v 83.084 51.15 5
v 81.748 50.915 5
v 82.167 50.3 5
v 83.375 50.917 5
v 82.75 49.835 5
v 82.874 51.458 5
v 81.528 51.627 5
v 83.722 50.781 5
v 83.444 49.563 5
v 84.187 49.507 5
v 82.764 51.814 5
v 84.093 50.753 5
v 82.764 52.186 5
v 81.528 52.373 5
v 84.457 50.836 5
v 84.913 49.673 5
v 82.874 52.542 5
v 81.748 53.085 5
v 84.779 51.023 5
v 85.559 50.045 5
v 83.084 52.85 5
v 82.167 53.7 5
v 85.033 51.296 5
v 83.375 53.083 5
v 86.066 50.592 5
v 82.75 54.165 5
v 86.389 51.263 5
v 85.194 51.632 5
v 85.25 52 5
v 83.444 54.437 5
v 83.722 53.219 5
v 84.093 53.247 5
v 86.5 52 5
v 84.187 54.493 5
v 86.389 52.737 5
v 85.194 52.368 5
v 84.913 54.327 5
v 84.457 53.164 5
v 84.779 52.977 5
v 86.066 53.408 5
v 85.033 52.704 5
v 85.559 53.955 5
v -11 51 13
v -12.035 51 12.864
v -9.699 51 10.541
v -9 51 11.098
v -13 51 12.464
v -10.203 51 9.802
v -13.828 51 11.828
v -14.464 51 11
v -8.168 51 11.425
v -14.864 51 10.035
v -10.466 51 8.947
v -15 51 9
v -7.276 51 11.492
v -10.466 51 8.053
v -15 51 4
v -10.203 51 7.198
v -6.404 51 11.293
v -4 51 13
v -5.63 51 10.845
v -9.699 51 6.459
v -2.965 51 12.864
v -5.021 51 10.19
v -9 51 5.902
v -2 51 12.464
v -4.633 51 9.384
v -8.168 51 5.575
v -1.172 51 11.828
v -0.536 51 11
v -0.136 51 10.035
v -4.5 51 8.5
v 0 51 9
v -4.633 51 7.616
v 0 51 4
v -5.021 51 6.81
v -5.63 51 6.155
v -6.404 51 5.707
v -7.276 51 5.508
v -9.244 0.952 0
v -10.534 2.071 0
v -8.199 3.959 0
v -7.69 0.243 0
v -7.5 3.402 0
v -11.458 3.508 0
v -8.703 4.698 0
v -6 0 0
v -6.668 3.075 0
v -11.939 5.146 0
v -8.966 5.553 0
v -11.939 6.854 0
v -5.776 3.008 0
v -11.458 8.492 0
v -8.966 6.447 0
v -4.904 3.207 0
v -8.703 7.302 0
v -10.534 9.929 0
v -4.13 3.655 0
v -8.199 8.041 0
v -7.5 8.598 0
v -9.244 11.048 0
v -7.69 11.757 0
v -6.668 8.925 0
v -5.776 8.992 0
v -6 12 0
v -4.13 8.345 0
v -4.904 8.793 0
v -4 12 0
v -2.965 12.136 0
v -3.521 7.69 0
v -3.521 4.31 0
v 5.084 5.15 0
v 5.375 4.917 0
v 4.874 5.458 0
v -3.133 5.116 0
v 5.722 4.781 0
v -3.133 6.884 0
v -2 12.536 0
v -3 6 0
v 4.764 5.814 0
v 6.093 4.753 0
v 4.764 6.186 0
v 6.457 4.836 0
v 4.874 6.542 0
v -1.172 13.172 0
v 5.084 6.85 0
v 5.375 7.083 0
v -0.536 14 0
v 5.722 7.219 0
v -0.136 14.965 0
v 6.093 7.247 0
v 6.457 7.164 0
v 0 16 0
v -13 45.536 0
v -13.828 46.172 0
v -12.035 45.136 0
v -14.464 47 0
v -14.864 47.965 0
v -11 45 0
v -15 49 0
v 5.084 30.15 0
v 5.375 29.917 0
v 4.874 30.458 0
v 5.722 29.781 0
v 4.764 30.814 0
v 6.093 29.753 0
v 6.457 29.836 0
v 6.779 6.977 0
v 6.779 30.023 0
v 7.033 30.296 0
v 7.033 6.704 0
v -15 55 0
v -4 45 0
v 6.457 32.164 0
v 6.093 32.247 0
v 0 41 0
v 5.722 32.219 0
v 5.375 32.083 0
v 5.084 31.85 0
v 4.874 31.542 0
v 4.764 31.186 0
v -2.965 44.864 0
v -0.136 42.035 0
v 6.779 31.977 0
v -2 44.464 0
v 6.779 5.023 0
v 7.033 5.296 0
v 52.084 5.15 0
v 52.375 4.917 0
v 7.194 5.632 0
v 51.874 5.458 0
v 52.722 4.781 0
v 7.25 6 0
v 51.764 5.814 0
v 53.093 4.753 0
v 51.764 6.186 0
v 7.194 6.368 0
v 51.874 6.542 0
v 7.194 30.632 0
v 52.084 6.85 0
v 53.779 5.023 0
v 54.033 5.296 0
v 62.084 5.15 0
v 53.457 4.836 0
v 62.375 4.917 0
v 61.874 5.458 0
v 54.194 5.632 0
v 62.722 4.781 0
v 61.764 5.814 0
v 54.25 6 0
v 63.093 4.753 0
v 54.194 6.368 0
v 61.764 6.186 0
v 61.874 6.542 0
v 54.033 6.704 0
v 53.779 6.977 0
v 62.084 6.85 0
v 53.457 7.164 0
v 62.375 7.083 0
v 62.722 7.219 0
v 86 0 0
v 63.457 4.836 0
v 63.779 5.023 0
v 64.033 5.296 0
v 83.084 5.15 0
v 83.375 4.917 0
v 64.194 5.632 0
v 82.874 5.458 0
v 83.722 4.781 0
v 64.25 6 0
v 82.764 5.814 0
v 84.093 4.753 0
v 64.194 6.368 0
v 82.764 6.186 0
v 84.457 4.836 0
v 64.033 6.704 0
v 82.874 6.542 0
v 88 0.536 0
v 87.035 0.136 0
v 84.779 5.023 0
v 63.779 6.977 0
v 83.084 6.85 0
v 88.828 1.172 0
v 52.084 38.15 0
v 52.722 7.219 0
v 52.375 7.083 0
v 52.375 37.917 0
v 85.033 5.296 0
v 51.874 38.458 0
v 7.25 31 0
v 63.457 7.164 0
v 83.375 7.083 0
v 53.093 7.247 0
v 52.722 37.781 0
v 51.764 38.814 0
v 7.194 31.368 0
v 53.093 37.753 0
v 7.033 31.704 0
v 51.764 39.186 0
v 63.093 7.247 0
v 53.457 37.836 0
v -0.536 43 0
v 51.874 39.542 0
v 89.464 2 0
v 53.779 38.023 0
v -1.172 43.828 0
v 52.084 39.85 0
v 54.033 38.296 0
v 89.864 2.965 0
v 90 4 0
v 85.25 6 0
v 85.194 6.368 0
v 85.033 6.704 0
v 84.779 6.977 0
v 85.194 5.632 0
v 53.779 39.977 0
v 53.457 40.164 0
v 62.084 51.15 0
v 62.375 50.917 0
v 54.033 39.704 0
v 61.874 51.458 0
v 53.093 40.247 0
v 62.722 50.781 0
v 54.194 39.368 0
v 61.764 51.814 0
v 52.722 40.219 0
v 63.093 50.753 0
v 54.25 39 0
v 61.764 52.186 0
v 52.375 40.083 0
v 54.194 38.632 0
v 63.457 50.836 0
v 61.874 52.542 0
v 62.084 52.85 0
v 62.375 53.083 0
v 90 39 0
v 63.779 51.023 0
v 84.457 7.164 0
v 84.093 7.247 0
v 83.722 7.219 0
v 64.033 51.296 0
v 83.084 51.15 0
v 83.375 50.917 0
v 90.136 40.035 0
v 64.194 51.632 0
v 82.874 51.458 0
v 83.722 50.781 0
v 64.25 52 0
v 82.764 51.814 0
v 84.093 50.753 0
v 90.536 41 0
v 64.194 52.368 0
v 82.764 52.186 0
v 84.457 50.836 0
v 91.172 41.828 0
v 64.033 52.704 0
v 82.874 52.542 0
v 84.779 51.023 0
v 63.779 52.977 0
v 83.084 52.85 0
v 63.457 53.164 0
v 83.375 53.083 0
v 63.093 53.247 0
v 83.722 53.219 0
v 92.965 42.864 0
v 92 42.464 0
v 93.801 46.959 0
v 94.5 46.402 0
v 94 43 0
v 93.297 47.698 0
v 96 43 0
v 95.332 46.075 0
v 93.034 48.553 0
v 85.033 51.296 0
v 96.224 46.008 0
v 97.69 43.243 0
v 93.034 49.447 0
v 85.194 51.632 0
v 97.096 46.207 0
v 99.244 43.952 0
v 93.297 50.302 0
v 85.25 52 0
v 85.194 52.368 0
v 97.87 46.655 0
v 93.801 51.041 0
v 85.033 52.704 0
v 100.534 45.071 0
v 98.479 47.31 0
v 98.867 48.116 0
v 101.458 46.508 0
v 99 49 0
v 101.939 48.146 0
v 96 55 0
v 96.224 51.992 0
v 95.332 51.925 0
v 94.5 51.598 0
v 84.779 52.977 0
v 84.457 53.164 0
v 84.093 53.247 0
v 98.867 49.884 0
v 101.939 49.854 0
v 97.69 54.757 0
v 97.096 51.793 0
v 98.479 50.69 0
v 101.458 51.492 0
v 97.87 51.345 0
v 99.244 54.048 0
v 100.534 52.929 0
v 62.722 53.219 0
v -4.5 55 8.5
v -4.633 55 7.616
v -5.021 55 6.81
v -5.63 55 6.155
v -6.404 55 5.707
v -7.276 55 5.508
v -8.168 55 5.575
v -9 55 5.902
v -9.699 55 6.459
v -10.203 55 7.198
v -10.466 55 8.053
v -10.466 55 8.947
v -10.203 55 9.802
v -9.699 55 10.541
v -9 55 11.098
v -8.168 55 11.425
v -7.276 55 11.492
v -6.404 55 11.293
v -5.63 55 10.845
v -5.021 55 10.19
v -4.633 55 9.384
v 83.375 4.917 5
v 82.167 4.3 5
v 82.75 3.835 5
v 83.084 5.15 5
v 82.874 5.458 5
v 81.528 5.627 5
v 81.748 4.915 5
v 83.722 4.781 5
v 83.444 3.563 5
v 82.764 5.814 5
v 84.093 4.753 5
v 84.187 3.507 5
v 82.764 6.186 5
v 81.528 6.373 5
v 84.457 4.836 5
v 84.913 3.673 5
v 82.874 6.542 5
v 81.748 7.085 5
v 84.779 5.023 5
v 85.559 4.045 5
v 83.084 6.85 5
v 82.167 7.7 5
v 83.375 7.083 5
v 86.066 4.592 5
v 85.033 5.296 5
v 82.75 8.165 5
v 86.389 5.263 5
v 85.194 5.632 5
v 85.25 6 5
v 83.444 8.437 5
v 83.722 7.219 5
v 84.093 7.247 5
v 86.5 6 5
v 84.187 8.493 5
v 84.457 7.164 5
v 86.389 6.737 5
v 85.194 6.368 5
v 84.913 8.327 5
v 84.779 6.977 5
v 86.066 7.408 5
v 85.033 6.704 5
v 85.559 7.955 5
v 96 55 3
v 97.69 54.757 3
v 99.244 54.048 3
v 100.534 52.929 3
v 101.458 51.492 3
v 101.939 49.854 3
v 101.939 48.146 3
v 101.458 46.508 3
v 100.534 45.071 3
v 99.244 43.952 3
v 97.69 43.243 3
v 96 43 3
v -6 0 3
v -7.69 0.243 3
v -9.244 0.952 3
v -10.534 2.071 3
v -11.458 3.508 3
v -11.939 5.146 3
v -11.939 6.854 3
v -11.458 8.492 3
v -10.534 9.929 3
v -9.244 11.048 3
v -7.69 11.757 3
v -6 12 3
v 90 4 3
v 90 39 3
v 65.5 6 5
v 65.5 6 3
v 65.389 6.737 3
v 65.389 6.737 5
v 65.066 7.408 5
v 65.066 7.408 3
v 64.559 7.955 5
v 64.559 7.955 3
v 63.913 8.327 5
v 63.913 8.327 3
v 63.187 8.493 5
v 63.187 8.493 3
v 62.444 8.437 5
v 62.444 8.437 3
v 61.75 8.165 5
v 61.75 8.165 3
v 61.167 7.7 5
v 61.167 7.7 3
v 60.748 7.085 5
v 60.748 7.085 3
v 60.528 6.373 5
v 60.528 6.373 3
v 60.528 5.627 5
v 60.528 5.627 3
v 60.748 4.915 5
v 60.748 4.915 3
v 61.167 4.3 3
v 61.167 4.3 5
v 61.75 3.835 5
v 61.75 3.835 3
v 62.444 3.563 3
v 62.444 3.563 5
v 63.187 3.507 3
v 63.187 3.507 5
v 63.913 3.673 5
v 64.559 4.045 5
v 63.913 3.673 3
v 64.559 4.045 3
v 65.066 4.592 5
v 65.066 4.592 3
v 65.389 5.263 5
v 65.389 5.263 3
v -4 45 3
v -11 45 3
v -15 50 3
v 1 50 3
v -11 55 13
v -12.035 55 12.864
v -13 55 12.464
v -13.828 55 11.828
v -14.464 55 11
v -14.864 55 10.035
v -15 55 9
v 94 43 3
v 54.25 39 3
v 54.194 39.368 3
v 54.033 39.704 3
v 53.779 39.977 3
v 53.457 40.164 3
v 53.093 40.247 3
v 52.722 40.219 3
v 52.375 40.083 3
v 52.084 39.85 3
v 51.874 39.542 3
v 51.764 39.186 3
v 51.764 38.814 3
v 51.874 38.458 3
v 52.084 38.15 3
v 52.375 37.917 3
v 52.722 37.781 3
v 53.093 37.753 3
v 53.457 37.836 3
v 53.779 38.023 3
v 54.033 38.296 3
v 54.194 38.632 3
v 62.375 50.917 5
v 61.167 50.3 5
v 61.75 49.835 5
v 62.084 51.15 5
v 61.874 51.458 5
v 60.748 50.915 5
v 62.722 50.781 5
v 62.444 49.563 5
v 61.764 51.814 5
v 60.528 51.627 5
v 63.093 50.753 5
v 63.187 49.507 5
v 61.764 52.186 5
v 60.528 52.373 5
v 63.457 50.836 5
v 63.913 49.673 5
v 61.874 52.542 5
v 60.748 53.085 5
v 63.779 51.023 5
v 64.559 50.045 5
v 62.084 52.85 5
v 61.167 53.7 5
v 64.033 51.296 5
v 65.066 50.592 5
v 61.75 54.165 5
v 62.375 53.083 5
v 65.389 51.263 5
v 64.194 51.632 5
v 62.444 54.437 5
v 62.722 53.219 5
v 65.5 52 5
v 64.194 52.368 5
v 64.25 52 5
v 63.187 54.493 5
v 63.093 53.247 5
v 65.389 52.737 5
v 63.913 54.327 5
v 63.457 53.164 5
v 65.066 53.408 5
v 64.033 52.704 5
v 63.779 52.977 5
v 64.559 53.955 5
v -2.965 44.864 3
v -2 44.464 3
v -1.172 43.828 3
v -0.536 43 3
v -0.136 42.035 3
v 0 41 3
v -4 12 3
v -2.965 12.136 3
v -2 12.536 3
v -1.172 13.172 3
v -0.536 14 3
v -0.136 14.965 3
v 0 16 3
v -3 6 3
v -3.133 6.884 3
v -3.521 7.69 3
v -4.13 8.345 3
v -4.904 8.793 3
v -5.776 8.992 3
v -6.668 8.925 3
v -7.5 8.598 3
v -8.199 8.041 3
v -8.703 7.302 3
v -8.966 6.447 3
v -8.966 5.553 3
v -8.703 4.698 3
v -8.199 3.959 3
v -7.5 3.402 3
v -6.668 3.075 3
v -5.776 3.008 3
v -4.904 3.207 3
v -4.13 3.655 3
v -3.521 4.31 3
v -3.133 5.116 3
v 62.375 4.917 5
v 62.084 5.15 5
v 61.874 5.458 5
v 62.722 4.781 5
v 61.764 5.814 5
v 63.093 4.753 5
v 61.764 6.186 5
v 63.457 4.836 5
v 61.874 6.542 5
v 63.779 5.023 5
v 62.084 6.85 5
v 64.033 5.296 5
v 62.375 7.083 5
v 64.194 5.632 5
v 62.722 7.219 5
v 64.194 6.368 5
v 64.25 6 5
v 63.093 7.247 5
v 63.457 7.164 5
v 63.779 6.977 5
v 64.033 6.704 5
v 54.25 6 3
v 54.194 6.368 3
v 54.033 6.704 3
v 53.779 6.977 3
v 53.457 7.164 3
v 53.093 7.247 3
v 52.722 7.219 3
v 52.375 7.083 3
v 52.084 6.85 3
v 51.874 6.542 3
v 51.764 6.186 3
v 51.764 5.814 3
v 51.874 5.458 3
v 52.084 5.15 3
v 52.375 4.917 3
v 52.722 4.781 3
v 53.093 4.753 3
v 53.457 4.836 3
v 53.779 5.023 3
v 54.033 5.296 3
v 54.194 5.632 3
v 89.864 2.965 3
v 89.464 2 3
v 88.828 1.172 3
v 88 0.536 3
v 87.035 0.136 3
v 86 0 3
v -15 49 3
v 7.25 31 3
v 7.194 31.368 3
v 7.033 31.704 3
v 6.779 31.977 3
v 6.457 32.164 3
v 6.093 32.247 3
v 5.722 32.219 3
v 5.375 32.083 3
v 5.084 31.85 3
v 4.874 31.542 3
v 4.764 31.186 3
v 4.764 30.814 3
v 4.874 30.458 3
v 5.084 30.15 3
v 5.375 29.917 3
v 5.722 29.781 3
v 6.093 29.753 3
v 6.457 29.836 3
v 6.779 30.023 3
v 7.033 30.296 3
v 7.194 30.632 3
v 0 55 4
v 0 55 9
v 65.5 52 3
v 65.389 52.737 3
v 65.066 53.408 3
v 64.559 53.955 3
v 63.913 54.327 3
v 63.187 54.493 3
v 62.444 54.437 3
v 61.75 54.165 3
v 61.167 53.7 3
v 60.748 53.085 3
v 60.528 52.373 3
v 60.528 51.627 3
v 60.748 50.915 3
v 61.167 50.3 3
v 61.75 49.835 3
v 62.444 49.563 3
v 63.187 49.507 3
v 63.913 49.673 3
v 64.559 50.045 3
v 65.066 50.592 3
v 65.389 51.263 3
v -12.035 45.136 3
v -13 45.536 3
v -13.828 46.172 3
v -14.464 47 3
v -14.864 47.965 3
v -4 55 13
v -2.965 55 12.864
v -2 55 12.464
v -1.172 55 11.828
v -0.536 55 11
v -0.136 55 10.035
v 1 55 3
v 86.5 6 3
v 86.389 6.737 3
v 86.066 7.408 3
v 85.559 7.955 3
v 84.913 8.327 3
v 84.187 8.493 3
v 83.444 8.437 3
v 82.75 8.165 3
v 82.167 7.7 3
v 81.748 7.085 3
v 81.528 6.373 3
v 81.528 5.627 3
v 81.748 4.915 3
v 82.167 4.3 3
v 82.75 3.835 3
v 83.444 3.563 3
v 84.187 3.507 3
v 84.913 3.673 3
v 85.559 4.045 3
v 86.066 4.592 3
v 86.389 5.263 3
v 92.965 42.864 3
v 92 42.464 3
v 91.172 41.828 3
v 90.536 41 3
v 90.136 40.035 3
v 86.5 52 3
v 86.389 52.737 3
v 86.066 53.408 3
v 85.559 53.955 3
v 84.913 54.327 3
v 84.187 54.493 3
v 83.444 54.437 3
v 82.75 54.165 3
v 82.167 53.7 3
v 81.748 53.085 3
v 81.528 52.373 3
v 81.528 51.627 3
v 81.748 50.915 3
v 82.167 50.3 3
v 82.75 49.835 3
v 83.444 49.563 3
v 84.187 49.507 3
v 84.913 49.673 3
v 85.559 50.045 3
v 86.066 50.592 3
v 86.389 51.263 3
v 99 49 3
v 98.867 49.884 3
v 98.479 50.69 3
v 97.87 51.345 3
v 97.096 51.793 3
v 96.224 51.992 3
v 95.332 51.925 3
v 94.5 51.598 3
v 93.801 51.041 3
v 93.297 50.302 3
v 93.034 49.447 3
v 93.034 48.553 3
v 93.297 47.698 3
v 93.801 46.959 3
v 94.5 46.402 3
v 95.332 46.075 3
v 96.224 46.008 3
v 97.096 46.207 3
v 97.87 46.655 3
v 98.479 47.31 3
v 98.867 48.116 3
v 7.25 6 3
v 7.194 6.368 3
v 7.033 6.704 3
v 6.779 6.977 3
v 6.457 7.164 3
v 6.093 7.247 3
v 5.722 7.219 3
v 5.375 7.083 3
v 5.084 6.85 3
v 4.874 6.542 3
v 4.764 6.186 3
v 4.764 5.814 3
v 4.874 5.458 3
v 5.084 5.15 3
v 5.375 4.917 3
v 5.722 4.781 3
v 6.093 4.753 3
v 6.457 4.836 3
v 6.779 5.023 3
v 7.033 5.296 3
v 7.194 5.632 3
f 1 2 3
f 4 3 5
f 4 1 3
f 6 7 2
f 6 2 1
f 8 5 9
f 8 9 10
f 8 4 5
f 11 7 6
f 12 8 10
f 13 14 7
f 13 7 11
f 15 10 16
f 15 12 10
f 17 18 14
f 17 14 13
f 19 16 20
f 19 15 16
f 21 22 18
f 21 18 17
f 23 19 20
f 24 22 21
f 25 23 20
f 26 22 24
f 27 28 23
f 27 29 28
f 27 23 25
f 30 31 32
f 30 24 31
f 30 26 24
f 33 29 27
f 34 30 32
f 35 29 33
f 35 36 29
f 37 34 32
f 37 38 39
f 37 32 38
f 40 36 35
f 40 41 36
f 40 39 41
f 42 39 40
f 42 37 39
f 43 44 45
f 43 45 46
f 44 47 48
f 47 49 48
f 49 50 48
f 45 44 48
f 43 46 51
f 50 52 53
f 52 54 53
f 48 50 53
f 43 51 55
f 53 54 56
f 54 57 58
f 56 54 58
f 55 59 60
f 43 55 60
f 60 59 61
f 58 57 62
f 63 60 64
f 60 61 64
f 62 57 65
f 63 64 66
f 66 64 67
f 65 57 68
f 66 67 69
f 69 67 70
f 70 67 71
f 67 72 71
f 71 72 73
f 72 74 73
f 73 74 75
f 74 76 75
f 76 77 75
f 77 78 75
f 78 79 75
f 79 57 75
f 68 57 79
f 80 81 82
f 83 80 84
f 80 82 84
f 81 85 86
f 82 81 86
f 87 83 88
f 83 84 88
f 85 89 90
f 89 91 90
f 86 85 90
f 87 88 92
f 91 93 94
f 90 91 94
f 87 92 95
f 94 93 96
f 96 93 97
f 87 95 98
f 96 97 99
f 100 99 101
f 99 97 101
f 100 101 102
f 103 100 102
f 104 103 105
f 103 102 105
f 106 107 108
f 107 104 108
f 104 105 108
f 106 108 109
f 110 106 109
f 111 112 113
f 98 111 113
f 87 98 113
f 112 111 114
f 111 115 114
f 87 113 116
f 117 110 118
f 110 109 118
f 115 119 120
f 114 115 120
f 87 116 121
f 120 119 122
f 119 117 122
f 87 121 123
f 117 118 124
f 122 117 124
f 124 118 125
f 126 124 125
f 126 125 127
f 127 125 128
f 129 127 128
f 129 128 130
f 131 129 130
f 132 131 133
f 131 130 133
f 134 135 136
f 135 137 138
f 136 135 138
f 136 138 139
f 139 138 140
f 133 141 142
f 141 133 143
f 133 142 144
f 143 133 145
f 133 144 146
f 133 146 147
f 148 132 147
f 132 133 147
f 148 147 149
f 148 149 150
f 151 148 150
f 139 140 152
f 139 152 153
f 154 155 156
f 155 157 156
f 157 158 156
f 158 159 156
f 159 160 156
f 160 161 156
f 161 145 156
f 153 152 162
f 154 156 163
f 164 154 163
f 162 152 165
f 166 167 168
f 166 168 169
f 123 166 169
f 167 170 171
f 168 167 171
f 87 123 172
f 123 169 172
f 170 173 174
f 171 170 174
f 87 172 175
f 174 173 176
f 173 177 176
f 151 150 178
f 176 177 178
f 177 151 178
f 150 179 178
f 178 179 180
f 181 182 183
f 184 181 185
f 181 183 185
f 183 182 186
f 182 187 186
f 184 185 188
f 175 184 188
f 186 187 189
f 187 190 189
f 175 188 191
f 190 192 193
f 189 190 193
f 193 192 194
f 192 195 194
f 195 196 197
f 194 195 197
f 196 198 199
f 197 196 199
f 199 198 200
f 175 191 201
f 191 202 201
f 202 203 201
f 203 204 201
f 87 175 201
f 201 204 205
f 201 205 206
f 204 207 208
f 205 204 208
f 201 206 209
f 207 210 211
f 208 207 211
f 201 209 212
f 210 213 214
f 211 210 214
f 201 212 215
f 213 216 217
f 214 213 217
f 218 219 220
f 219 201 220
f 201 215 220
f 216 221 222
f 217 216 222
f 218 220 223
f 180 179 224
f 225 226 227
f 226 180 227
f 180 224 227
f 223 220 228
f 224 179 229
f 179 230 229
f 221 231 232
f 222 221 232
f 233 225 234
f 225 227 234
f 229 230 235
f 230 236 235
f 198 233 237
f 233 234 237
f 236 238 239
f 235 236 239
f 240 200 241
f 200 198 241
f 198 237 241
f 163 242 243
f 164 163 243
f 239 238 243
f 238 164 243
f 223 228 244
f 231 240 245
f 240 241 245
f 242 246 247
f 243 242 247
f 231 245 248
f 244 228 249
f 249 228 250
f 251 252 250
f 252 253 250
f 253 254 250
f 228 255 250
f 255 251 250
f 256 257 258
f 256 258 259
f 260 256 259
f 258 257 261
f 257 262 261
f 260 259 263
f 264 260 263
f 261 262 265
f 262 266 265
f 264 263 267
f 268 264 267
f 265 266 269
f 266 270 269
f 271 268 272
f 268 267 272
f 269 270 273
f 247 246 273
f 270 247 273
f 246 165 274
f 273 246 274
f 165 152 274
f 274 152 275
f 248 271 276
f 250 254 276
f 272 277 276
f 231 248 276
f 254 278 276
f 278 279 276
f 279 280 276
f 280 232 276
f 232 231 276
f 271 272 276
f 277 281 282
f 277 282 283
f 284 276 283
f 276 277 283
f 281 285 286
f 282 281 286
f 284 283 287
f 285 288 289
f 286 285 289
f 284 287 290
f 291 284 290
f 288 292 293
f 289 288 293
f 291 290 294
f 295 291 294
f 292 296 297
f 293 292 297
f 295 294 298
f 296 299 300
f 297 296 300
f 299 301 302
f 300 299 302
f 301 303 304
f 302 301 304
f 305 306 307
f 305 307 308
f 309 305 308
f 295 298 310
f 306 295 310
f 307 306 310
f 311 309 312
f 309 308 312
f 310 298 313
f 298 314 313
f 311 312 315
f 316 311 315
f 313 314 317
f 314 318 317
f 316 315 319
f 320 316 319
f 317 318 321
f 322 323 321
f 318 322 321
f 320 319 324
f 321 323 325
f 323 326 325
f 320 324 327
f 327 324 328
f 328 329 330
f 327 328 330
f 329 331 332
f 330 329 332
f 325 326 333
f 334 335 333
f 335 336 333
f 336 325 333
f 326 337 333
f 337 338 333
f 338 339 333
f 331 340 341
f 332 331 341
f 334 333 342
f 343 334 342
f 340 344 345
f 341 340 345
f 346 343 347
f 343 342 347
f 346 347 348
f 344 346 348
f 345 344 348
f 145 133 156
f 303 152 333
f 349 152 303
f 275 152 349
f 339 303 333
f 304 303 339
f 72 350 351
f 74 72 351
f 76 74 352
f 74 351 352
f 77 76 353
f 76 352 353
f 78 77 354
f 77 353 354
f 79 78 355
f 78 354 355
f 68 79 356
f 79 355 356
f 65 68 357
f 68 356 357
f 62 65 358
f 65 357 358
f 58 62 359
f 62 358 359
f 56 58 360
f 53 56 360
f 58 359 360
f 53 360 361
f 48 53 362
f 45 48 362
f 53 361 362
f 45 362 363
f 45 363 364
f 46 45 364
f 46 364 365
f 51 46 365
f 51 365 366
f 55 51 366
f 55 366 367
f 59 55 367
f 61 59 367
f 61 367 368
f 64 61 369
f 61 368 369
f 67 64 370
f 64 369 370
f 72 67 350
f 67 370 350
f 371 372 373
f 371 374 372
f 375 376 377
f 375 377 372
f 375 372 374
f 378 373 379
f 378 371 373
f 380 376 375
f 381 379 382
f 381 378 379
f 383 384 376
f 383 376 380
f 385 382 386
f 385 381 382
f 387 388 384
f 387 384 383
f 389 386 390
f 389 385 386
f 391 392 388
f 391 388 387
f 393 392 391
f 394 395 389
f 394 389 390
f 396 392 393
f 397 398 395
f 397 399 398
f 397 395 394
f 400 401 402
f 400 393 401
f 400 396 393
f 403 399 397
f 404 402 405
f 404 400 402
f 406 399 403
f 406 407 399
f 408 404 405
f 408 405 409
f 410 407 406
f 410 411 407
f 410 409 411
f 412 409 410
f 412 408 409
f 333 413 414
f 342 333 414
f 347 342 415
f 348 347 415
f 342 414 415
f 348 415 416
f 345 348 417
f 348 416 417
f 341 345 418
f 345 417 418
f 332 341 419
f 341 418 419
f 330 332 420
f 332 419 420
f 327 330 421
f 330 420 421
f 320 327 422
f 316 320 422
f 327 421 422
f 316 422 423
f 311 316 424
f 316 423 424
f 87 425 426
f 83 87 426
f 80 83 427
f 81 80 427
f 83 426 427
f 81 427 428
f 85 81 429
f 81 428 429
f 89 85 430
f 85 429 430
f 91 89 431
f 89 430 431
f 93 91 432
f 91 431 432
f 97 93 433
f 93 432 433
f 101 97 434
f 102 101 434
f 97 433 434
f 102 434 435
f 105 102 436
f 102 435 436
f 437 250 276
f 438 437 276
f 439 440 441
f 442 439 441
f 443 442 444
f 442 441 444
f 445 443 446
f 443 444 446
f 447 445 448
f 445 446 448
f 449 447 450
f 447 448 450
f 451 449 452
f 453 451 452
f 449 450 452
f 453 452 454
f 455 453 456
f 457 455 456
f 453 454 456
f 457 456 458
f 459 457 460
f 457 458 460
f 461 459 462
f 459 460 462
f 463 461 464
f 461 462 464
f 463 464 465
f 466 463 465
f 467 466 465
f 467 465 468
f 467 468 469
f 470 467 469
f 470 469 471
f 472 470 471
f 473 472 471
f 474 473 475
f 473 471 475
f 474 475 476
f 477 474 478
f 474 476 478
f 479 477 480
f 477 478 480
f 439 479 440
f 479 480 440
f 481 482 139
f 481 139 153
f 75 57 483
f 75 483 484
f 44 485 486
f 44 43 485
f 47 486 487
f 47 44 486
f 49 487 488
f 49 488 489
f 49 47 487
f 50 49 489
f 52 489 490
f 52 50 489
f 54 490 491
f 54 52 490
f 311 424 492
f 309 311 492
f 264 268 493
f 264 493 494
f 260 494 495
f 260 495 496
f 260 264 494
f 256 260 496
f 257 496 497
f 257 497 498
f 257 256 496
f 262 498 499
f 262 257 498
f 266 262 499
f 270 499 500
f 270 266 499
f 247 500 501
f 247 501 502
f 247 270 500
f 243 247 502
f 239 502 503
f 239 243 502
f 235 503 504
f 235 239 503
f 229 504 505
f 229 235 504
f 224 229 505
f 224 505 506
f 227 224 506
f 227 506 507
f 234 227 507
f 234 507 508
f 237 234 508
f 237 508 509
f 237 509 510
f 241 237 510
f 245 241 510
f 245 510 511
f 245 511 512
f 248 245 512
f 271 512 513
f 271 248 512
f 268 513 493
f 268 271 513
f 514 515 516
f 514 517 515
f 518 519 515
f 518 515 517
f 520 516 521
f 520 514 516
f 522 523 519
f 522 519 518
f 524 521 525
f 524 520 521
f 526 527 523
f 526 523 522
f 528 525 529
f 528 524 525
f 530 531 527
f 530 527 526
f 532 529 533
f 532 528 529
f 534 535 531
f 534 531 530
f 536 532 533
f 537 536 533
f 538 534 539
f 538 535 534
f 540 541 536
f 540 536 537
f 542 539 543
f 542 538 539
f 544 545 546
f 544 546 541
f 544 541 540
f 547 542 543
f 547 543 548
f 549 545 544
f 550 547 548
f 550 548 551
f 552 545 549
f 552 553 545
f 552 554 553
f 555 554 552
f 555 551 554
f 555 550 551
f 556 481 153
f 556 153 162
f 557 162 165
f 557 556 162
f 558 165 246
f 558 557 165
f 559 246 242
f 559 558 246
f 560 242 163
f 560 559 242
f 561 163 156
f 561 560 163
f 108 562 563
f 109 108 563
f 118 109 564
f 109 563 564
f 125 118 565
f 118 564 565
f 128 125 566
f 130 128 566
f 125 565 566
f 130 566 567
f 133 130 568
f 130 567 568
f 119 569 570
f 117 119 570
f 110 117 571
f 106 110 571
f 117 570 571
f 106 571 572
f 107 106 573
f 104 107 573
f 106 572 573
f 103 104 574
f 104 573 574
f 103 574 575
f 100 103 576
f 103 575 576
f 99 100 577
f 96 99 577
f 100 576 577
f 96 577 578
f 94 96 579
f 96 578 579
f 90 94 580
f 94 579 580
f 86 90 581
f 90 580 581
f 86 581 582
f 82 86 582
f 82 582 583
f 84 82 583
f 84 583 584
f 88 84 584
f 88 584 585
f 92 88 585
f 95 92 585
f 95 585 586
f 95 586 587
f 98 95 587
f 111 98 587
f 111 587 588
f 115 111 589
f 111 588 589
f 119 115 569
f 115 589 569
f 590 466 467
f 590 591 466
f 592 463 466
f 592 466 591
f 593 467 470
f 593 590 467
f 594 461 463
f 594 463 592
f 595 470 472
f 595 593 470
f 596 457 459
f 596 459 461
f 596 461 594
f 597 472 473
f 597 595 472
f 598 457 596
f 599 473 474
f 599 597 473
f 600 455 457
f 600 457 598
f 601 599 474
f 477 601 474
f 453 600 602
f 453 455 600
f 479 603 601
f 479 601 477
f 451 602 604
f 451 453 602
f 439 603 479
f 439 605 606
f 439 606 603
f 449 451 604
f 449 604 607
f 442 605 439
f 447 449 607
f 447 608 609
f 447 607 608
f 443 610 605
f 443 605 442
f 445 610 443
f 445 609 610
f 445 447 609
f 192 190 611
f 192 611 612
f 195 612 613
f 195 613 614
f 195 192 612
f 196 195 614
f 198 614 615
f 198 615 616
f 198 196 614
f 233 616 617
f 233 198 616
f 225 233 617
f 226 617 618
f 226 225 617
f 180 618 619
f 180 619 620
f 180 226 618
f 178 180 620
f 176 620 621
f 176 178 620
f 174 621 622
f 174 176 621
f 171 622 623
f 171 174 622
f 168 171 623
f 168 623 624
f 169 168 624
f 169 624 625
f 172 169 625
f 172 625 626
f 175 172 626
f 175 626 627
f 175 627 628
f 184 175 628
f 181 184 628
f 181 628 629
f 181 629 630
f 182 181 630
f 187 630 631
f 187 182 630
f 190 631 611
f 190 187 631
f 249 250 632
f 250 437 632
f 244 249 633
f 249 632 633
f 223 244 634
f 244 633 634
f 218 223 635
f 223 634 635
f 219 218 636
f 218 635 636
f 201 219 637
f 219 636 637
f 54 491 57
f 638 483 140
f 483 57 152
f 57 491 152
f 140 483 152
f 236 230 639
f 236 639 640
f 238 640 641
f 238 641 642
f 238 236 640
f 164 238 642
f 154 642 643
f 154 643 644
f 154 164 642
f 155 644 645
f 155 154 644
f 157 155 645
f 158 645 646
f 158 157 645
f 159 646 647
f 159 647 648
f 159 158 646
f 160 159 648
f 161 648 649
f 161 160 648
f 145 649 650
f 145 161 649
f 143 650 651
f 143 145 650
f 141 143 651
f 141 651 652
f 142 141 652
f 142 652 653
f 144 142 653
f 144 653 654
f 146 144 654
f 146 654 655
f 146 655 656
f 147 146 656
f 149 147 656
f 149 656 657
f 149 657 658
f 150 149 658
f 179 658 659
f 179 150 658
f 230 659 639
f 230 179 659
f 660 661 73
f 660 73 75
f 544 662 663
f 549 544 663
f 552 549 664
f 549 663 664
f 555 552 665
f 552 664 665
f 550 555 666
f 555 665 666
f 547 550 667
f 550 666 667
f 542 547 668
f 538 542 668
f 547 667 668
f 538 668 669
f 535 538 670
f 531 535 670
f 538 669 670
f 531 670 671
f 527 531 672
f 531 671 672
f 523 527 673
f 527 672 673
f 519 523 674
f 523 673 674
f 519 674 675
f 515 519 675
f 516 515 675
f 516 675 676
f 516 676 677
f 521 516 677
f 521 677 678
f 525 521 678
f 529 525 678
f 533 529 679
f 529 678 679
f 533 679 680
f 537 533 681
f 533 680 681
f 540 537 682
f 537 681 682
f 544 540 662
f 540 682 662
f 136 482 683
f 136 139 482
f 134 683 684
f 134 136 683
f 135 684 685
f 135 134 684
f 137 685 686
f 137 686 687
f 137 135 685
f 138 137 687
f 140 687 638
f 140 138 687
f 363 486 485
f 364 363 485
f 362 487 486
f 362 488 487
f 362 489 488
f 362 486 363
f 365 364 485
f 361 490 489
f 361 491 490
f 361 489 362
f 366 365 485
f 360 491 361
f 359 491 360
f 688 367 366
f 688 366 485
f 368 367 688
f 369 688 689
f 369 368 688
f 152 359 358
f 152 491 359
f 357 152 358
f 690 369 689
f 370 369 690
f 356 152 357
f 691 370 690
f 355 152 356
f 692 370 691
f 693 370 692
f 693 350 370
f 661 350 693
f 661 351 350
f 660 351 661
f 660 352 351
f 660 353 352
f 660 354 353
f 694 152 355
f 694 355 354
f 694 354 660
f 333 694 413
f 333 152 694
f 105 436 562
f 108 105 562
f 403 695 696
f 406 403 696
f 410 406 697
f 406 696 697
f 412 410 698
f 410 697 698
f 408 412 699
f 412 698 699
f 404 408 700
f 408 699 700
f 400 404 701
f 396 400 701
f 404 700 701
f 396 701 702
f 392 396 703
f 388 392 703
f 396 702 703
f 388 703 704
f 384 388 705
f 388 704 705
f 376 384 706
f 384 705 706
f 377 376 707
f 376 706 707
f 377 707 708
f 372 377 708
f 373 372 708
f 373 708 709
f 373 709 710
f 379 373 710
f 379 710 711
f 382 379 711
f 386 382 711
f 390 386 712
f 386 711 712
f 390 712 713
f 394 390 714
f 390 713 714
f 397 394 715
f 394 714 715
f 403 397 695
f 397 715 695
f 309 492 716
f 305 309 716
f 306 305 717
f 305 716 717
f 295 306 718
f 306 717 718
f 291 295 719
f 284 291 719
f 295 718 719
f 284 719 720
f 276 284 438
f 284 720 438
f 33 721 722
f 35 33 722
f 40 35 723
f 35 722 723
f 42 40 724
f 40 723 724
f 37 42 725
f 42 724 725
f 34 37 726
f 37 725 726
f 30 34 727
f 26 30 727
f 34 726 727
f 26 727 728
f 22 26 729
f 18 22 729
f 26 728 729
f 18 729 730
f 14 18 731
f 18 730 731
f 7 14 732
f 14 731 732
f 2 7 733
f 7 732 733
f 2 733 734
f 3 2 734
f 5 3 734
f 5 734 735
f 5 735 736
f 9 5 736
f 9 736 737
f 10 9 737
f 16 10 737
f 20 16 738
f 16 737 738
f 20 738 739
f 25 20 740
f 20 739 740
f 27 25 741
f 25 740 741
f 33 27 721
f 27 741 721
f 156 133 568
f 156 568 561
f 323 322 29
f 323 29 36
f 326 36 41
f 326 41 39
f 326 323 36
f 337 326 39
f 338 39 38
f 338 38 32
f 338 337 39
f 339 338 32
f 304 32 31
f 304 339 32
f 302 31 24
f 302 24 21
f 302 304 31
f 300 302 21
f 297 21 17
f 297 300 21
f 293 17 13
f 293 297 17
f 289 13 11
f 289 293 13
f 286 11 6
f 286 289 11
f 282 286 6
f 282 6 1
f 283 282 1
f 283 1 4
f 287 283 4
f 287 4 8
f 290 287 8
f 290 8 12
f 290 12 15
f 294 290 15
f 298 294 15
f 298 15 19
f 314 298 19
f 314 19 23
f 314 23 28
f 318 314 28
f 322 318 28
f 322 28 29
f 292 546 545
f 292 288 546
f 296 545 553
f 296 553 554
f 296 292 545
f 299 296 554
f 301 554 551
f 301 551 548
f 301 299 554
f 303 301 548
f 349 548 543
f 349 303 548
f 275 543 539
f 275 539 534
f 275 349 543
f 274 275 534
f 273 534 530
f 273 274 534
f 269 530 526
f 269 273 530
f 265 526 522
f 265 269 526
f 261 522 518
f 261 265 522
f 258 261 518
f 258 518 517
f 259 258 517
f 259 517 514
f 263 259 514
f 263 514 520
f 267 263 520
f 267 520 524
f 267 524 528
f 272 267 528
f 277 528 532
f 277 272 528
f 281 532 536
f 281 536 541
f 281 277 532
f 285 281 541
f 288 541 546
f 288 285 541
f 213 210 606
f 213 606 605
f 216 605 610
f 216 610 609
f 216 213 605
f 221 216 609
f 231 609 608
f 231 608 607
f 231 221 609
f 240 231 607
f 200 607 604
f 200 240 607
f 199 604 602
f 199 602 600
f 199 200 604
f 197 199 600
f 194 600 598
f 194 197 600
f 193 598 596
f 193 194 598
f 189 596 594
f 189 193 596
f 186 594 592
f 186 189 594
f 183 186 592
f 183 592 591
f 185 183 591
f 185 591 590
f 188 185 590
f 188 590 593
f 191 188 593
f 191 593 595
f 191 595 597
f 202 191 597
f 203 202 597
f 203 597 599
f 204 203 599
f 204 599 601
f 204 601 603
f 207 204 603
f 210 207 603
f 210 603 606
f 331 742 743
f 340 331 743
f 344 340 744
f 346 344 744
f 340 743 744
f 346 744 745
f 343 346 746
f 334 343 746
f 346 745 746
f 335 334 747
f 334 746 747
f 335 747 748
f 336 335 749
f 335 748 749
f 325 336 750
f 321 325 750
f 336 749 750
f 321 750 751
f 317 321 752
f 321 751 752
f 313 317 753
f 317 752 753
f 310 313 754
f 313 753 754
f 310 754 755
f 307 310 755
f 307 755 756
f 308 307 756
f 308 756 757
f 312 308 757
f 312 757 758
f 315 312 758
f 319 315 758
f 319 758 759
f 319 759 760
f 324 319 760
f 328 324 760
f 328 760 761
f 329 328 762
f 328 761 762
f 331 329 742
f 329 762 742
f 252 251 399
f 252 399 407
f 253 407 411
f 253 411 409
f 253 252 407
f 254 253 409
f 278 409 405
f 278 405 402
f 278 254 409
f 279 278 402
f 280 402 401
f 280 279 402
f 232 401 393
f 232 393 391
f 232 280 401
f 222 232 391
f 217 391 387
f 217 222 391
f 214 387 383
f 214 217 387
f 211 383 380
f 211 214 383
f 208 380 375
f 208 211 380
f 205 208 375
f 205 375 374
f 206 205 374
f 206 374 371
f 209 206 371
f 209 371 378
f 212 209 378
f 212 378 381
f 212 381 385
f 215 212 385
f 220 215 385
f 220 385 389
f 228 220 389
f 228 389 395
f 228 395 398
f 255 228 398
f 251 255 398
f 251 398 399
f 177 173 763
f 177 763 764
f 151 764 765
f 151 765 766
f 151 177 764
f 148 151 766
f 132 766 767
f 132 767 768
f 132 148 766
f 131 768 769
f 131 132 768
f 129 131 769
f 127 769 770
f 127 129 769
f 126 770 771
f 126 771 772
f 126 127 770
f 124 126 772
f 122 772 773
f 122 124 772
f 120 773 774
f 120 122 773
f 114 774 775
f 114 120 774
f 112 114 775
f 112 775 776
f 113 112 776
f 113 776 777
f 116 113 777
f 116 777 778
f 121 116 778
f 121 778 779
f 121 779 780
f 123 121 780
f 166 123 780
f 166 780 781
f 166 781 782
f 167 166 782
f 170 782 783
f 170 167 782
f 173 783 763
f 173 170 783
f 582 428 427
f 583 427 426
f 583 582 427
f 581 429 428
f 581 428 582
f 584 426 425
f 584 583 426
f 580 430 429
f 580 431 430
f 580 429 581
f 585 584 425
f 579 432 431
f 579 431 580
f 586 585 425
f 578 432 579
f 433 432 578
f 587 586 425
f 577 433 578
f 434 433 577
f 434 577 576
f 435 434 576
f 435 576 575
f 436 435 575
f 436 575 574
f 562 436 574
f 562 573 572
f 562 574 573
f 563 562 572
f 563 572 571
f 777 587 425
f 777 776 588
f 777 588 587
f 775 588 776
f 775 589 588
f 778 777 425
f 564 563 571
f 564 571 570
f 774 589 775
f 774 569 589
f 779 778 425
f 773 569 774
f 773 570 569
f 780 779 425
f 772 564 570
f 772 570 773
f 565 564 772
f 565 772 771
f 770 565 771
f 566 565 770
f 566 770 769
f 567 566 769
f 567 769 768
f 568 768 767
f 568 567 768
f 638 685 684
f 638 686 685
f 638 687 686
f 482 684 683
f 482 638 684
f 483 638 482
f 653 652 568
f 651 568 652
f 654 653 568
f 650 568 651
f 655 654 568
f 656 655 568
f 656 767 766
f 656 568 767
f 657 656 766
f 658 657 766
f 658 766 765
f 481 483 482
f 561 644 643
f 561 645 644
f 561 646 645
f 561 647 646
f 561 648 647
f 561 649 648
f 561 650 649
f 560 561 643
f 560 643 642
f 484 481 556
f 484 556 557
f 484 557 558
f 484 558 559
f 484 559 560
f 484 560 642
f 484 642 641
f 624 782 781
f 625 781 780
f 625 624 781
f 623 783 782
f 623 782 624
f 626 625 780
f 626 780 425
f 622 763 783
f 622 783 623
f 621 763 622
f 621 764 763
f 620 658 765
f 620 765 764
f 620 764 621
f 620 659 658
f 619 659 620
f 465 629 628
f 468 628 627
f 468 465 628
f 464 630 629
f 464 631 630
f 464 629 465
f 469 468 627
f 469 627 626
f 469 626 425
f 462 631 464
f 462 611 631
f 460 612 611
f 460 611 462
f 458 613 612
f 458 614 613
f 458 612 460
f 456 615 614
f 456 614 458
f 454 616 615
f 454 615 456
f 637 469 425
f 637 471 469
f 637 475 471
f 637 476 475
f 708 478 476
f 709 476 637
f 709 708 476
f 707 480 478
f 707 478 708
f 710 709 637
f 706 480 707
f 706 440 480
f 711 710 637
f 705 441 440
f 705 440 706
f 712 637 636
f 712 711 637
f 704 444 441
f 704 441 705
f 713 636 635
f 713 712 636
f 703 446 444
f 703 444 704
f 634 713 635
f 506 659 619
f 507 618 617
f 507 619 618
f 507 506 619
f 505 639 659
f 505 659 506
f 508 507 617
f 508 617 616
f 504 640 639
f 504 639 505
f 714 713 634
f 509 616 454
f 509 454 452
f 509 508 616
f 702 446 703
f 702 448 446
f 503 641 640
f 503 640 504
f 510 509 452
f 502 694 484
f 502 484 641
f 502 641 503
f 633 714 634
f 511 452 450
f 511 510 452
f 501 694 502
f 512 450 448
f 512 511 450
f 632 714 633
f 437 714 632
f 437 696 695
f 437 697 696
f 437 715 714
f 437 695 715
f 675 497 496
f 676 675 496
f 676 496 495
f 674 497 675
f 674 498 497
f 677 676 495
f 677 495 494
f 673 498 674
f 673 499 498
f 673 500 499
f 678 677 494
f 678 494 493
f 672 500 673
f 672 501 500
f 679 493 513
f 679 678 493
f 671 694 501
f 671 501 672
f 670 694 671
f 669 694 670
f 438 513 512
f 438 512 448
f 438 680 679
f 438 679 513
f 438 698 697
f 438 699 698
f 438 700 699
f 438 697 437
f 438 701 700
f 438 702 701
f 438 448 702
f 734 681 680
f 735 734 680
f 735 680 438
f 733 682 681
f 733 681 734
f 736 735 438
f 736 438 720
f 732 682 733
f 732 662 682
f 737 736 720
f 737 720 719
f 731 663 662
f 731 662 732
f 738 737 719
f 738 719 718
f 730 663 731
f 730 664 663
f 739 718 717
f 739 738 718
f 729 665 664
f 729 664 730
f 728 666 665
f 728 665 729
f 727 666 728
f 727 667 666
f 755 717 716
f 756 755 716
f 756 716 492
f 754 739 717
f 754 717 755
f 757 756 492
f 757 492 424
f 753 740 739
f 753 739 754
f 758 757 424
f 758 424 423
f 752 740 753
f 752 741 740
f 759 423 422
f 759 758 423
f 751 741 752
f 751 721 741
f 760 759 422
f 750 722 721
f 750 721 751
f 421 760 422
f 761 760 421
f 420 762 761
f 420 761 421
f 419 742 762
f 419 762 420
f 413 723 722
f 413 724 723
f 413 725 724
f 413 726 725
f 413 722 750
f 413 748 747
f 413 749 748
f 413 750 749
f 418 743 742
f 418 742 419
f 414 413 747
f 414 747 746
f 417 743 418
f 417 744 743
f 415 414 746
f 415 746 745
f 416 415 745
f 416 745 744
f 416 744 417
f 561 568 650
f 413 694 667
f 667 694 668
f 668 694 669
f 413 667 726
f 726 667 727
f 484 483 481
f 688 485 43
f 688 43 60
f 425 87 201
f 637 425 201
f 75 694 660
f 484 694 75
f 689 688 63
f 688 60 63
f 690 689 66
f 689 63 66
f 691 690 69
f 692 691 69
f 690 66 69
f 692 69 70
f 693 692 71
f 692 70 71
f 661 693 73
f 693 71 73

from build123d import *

# Parameters (mm, degrees)
SKETCH_1_W      = 90
SKETCH_1_H      = 55
SKETCH_1_R      = 1.25
EXTRUDE_1_DEPTH = 3
SKETCH_2_R      = 3
EXTRUDE_2_DEPTH = 3
SKETCH_3_W      = 15
SKETCH_3_H      = 10
SKETCH_3_R      = 3
EXTRUDE_3_DEPTH = 4
CHAMFER_1_SIZE  = 1
SKETCH_4_R      = 2.5
SKETCH_4_R_2    = 1.25
EXTRUDE_4_DEPTH = 2
FILLET_1_R      = 4


with BuildPart() as part:
    # Эскиз1 → Бобышка-Вытянуть1 (new body)
    with BuildSketch(Plane.XY):
        with Locations((45, 27.5)):
            Rectangle(SKETCH_1_W, SKETCH_1_H)
        with Locations((6, 31)):
            Circle(SKETCH_1_R, mode=Mode.SUBTRACT)
        with Locations((6, 6)):
            Circle(SKETCH_1_R, mode=Mode.SUBTRACT)
        with Locations((53, 39)):
            Circle(SKETCH_1_R, mode=Mode.SUBTRACT)
        with Locations((53, 6)):
            Circle(SKETCH_1_R, mode=Mode.SUBTRACT)
        with Locations((63, 6)):
            Circle(SKETCH_1_R, mode=Mode.SUBTRACT)
        with Locations((63, 52)):
            Circle(SKETCH_1_R, mode=Mode.SUBTRACT)
        with Locations((84, 52)):
            Circle(SKETCH_1_R, mode=Mode.SUBTRACT)
        with Locations((84, 6)):
            Circle(SKETCH_1_R, mode=Mode.SUBTRACT)
    extrude(amount=EXTRUDE_1_DEPTH)

    # Эскиз2 → Бобышка-Вытянуть2 (add)
    with BuildSketch(Plane.XY.offset(3)):
        with BuildLine():
            Line((0, 55), (-15, 55))
            Line((-15, 55), (-15, 45))
            Line((-15, 45), (-4, 45))
            ThreePointArc((-4, 45), (-1.171572875, 43.828427125), (0, 41))
            Line((0, 41), (0, 55))
        make_face()
        with BuildLine():
            Line((0, 0), (-6, 0))
            ThreePointArc((-6, 0), (-12, 6), (-6, 12))
            Line((-6, 12), (-4, 12))
            ThreePointArc((-4, 12), (-1.171572875, 13.171572875), (0, 16))
            Line((0, 16), (0, 0))
        make_face()
        with Locations((-6, 6)):
            Circle(SKETCH_2_R, mode=Mode.SUBTRACT)
        with BuildLine():
            Line((90, 55), (96, 55))
            ThreePointArc((96, 55), (102, 49), (96, 43))
            Line((96, 43), (94, 43))
            ThreePointArc((94, 43), (91.171572875, 41.828427125), (90, 39))
            Line((90, 39), (90, 55))
        make_face()
        with Locations((96, 49)):
            Circle(SKETCH_2_R, mode=Mode.SUBTRACT)
    extrude(amount=-EXTRUDE_2_DEPTH)

    # Эскиз3 → Бобышка-Вытянуть3 (add)
    with BuildSketch(Plane(origin=(0, 55, 0), x_dir=(1, 0, 0), z_dir=(0, 1, 0))):
        with Locations((-7.5, -8)):
            Rectangle(SKETCH_3_W, SKETCH_3_H)
        with Locations((-7.5, -8.5)):
            Circle(SKETCH_3_R, mode=Mode.SUBTRACT)
    extrude(amount=-EXTRUDE_3_DEPTH)

    # Фаска1
    chamfer_1_edges = [part.edges().sort_by_distance(p)[0] for p in [
        (-7.5, 51, 3),
        (0, 53, 3),
    ]]
    chamfer(chamfer_1_edges, length=CHAMFER_1_SIZE)

    # Эскиз4 → Бобышка-Вытянуть4 (add)
    with BuildSketch(Plane.XY.offset(3)):
        with Locations((63, 52)):
            Circle(SKETCH_4_R)
        with Locations((63, 52)):
            Circle(SKETCH_4_R_2, mode=Mode.SUBTRACT)
        with Locations((84, 52)):
            Circle(SKETCH_4_R)
        with Locations((84, 52)):
            Circle(SKETCH_4_R_2, mode=Mode.SUBTRACT)
        with Locations((63, 6)):
            Circle(SKETCH_4_R)
        with Locations((63, 6)):
            Circle(SKETCH_4_R_2, mode=Mode.SUBTRACT)
        with Locations((84, 6)):
            Circle(SKETCH_4_R)
        with Locations((84, 6)):
            Circle(SKETCH_4_R_2, mode=Mode.SUBTRACT)
    extrude(amount=EXTRUDE_4_DEPTH)

    # Скругление1
    fillet_1_edges = [part.edges().sort_by_distance(p)[0] for p in [
        (-15, 45, 1.5),
        (90, 0, 1.5),
        (-15, 53, 13),
        (0, 53, 13),
    ]]
    fillet(fillet_1_edges, radius=FILLET_1_R)


solid = part.part
